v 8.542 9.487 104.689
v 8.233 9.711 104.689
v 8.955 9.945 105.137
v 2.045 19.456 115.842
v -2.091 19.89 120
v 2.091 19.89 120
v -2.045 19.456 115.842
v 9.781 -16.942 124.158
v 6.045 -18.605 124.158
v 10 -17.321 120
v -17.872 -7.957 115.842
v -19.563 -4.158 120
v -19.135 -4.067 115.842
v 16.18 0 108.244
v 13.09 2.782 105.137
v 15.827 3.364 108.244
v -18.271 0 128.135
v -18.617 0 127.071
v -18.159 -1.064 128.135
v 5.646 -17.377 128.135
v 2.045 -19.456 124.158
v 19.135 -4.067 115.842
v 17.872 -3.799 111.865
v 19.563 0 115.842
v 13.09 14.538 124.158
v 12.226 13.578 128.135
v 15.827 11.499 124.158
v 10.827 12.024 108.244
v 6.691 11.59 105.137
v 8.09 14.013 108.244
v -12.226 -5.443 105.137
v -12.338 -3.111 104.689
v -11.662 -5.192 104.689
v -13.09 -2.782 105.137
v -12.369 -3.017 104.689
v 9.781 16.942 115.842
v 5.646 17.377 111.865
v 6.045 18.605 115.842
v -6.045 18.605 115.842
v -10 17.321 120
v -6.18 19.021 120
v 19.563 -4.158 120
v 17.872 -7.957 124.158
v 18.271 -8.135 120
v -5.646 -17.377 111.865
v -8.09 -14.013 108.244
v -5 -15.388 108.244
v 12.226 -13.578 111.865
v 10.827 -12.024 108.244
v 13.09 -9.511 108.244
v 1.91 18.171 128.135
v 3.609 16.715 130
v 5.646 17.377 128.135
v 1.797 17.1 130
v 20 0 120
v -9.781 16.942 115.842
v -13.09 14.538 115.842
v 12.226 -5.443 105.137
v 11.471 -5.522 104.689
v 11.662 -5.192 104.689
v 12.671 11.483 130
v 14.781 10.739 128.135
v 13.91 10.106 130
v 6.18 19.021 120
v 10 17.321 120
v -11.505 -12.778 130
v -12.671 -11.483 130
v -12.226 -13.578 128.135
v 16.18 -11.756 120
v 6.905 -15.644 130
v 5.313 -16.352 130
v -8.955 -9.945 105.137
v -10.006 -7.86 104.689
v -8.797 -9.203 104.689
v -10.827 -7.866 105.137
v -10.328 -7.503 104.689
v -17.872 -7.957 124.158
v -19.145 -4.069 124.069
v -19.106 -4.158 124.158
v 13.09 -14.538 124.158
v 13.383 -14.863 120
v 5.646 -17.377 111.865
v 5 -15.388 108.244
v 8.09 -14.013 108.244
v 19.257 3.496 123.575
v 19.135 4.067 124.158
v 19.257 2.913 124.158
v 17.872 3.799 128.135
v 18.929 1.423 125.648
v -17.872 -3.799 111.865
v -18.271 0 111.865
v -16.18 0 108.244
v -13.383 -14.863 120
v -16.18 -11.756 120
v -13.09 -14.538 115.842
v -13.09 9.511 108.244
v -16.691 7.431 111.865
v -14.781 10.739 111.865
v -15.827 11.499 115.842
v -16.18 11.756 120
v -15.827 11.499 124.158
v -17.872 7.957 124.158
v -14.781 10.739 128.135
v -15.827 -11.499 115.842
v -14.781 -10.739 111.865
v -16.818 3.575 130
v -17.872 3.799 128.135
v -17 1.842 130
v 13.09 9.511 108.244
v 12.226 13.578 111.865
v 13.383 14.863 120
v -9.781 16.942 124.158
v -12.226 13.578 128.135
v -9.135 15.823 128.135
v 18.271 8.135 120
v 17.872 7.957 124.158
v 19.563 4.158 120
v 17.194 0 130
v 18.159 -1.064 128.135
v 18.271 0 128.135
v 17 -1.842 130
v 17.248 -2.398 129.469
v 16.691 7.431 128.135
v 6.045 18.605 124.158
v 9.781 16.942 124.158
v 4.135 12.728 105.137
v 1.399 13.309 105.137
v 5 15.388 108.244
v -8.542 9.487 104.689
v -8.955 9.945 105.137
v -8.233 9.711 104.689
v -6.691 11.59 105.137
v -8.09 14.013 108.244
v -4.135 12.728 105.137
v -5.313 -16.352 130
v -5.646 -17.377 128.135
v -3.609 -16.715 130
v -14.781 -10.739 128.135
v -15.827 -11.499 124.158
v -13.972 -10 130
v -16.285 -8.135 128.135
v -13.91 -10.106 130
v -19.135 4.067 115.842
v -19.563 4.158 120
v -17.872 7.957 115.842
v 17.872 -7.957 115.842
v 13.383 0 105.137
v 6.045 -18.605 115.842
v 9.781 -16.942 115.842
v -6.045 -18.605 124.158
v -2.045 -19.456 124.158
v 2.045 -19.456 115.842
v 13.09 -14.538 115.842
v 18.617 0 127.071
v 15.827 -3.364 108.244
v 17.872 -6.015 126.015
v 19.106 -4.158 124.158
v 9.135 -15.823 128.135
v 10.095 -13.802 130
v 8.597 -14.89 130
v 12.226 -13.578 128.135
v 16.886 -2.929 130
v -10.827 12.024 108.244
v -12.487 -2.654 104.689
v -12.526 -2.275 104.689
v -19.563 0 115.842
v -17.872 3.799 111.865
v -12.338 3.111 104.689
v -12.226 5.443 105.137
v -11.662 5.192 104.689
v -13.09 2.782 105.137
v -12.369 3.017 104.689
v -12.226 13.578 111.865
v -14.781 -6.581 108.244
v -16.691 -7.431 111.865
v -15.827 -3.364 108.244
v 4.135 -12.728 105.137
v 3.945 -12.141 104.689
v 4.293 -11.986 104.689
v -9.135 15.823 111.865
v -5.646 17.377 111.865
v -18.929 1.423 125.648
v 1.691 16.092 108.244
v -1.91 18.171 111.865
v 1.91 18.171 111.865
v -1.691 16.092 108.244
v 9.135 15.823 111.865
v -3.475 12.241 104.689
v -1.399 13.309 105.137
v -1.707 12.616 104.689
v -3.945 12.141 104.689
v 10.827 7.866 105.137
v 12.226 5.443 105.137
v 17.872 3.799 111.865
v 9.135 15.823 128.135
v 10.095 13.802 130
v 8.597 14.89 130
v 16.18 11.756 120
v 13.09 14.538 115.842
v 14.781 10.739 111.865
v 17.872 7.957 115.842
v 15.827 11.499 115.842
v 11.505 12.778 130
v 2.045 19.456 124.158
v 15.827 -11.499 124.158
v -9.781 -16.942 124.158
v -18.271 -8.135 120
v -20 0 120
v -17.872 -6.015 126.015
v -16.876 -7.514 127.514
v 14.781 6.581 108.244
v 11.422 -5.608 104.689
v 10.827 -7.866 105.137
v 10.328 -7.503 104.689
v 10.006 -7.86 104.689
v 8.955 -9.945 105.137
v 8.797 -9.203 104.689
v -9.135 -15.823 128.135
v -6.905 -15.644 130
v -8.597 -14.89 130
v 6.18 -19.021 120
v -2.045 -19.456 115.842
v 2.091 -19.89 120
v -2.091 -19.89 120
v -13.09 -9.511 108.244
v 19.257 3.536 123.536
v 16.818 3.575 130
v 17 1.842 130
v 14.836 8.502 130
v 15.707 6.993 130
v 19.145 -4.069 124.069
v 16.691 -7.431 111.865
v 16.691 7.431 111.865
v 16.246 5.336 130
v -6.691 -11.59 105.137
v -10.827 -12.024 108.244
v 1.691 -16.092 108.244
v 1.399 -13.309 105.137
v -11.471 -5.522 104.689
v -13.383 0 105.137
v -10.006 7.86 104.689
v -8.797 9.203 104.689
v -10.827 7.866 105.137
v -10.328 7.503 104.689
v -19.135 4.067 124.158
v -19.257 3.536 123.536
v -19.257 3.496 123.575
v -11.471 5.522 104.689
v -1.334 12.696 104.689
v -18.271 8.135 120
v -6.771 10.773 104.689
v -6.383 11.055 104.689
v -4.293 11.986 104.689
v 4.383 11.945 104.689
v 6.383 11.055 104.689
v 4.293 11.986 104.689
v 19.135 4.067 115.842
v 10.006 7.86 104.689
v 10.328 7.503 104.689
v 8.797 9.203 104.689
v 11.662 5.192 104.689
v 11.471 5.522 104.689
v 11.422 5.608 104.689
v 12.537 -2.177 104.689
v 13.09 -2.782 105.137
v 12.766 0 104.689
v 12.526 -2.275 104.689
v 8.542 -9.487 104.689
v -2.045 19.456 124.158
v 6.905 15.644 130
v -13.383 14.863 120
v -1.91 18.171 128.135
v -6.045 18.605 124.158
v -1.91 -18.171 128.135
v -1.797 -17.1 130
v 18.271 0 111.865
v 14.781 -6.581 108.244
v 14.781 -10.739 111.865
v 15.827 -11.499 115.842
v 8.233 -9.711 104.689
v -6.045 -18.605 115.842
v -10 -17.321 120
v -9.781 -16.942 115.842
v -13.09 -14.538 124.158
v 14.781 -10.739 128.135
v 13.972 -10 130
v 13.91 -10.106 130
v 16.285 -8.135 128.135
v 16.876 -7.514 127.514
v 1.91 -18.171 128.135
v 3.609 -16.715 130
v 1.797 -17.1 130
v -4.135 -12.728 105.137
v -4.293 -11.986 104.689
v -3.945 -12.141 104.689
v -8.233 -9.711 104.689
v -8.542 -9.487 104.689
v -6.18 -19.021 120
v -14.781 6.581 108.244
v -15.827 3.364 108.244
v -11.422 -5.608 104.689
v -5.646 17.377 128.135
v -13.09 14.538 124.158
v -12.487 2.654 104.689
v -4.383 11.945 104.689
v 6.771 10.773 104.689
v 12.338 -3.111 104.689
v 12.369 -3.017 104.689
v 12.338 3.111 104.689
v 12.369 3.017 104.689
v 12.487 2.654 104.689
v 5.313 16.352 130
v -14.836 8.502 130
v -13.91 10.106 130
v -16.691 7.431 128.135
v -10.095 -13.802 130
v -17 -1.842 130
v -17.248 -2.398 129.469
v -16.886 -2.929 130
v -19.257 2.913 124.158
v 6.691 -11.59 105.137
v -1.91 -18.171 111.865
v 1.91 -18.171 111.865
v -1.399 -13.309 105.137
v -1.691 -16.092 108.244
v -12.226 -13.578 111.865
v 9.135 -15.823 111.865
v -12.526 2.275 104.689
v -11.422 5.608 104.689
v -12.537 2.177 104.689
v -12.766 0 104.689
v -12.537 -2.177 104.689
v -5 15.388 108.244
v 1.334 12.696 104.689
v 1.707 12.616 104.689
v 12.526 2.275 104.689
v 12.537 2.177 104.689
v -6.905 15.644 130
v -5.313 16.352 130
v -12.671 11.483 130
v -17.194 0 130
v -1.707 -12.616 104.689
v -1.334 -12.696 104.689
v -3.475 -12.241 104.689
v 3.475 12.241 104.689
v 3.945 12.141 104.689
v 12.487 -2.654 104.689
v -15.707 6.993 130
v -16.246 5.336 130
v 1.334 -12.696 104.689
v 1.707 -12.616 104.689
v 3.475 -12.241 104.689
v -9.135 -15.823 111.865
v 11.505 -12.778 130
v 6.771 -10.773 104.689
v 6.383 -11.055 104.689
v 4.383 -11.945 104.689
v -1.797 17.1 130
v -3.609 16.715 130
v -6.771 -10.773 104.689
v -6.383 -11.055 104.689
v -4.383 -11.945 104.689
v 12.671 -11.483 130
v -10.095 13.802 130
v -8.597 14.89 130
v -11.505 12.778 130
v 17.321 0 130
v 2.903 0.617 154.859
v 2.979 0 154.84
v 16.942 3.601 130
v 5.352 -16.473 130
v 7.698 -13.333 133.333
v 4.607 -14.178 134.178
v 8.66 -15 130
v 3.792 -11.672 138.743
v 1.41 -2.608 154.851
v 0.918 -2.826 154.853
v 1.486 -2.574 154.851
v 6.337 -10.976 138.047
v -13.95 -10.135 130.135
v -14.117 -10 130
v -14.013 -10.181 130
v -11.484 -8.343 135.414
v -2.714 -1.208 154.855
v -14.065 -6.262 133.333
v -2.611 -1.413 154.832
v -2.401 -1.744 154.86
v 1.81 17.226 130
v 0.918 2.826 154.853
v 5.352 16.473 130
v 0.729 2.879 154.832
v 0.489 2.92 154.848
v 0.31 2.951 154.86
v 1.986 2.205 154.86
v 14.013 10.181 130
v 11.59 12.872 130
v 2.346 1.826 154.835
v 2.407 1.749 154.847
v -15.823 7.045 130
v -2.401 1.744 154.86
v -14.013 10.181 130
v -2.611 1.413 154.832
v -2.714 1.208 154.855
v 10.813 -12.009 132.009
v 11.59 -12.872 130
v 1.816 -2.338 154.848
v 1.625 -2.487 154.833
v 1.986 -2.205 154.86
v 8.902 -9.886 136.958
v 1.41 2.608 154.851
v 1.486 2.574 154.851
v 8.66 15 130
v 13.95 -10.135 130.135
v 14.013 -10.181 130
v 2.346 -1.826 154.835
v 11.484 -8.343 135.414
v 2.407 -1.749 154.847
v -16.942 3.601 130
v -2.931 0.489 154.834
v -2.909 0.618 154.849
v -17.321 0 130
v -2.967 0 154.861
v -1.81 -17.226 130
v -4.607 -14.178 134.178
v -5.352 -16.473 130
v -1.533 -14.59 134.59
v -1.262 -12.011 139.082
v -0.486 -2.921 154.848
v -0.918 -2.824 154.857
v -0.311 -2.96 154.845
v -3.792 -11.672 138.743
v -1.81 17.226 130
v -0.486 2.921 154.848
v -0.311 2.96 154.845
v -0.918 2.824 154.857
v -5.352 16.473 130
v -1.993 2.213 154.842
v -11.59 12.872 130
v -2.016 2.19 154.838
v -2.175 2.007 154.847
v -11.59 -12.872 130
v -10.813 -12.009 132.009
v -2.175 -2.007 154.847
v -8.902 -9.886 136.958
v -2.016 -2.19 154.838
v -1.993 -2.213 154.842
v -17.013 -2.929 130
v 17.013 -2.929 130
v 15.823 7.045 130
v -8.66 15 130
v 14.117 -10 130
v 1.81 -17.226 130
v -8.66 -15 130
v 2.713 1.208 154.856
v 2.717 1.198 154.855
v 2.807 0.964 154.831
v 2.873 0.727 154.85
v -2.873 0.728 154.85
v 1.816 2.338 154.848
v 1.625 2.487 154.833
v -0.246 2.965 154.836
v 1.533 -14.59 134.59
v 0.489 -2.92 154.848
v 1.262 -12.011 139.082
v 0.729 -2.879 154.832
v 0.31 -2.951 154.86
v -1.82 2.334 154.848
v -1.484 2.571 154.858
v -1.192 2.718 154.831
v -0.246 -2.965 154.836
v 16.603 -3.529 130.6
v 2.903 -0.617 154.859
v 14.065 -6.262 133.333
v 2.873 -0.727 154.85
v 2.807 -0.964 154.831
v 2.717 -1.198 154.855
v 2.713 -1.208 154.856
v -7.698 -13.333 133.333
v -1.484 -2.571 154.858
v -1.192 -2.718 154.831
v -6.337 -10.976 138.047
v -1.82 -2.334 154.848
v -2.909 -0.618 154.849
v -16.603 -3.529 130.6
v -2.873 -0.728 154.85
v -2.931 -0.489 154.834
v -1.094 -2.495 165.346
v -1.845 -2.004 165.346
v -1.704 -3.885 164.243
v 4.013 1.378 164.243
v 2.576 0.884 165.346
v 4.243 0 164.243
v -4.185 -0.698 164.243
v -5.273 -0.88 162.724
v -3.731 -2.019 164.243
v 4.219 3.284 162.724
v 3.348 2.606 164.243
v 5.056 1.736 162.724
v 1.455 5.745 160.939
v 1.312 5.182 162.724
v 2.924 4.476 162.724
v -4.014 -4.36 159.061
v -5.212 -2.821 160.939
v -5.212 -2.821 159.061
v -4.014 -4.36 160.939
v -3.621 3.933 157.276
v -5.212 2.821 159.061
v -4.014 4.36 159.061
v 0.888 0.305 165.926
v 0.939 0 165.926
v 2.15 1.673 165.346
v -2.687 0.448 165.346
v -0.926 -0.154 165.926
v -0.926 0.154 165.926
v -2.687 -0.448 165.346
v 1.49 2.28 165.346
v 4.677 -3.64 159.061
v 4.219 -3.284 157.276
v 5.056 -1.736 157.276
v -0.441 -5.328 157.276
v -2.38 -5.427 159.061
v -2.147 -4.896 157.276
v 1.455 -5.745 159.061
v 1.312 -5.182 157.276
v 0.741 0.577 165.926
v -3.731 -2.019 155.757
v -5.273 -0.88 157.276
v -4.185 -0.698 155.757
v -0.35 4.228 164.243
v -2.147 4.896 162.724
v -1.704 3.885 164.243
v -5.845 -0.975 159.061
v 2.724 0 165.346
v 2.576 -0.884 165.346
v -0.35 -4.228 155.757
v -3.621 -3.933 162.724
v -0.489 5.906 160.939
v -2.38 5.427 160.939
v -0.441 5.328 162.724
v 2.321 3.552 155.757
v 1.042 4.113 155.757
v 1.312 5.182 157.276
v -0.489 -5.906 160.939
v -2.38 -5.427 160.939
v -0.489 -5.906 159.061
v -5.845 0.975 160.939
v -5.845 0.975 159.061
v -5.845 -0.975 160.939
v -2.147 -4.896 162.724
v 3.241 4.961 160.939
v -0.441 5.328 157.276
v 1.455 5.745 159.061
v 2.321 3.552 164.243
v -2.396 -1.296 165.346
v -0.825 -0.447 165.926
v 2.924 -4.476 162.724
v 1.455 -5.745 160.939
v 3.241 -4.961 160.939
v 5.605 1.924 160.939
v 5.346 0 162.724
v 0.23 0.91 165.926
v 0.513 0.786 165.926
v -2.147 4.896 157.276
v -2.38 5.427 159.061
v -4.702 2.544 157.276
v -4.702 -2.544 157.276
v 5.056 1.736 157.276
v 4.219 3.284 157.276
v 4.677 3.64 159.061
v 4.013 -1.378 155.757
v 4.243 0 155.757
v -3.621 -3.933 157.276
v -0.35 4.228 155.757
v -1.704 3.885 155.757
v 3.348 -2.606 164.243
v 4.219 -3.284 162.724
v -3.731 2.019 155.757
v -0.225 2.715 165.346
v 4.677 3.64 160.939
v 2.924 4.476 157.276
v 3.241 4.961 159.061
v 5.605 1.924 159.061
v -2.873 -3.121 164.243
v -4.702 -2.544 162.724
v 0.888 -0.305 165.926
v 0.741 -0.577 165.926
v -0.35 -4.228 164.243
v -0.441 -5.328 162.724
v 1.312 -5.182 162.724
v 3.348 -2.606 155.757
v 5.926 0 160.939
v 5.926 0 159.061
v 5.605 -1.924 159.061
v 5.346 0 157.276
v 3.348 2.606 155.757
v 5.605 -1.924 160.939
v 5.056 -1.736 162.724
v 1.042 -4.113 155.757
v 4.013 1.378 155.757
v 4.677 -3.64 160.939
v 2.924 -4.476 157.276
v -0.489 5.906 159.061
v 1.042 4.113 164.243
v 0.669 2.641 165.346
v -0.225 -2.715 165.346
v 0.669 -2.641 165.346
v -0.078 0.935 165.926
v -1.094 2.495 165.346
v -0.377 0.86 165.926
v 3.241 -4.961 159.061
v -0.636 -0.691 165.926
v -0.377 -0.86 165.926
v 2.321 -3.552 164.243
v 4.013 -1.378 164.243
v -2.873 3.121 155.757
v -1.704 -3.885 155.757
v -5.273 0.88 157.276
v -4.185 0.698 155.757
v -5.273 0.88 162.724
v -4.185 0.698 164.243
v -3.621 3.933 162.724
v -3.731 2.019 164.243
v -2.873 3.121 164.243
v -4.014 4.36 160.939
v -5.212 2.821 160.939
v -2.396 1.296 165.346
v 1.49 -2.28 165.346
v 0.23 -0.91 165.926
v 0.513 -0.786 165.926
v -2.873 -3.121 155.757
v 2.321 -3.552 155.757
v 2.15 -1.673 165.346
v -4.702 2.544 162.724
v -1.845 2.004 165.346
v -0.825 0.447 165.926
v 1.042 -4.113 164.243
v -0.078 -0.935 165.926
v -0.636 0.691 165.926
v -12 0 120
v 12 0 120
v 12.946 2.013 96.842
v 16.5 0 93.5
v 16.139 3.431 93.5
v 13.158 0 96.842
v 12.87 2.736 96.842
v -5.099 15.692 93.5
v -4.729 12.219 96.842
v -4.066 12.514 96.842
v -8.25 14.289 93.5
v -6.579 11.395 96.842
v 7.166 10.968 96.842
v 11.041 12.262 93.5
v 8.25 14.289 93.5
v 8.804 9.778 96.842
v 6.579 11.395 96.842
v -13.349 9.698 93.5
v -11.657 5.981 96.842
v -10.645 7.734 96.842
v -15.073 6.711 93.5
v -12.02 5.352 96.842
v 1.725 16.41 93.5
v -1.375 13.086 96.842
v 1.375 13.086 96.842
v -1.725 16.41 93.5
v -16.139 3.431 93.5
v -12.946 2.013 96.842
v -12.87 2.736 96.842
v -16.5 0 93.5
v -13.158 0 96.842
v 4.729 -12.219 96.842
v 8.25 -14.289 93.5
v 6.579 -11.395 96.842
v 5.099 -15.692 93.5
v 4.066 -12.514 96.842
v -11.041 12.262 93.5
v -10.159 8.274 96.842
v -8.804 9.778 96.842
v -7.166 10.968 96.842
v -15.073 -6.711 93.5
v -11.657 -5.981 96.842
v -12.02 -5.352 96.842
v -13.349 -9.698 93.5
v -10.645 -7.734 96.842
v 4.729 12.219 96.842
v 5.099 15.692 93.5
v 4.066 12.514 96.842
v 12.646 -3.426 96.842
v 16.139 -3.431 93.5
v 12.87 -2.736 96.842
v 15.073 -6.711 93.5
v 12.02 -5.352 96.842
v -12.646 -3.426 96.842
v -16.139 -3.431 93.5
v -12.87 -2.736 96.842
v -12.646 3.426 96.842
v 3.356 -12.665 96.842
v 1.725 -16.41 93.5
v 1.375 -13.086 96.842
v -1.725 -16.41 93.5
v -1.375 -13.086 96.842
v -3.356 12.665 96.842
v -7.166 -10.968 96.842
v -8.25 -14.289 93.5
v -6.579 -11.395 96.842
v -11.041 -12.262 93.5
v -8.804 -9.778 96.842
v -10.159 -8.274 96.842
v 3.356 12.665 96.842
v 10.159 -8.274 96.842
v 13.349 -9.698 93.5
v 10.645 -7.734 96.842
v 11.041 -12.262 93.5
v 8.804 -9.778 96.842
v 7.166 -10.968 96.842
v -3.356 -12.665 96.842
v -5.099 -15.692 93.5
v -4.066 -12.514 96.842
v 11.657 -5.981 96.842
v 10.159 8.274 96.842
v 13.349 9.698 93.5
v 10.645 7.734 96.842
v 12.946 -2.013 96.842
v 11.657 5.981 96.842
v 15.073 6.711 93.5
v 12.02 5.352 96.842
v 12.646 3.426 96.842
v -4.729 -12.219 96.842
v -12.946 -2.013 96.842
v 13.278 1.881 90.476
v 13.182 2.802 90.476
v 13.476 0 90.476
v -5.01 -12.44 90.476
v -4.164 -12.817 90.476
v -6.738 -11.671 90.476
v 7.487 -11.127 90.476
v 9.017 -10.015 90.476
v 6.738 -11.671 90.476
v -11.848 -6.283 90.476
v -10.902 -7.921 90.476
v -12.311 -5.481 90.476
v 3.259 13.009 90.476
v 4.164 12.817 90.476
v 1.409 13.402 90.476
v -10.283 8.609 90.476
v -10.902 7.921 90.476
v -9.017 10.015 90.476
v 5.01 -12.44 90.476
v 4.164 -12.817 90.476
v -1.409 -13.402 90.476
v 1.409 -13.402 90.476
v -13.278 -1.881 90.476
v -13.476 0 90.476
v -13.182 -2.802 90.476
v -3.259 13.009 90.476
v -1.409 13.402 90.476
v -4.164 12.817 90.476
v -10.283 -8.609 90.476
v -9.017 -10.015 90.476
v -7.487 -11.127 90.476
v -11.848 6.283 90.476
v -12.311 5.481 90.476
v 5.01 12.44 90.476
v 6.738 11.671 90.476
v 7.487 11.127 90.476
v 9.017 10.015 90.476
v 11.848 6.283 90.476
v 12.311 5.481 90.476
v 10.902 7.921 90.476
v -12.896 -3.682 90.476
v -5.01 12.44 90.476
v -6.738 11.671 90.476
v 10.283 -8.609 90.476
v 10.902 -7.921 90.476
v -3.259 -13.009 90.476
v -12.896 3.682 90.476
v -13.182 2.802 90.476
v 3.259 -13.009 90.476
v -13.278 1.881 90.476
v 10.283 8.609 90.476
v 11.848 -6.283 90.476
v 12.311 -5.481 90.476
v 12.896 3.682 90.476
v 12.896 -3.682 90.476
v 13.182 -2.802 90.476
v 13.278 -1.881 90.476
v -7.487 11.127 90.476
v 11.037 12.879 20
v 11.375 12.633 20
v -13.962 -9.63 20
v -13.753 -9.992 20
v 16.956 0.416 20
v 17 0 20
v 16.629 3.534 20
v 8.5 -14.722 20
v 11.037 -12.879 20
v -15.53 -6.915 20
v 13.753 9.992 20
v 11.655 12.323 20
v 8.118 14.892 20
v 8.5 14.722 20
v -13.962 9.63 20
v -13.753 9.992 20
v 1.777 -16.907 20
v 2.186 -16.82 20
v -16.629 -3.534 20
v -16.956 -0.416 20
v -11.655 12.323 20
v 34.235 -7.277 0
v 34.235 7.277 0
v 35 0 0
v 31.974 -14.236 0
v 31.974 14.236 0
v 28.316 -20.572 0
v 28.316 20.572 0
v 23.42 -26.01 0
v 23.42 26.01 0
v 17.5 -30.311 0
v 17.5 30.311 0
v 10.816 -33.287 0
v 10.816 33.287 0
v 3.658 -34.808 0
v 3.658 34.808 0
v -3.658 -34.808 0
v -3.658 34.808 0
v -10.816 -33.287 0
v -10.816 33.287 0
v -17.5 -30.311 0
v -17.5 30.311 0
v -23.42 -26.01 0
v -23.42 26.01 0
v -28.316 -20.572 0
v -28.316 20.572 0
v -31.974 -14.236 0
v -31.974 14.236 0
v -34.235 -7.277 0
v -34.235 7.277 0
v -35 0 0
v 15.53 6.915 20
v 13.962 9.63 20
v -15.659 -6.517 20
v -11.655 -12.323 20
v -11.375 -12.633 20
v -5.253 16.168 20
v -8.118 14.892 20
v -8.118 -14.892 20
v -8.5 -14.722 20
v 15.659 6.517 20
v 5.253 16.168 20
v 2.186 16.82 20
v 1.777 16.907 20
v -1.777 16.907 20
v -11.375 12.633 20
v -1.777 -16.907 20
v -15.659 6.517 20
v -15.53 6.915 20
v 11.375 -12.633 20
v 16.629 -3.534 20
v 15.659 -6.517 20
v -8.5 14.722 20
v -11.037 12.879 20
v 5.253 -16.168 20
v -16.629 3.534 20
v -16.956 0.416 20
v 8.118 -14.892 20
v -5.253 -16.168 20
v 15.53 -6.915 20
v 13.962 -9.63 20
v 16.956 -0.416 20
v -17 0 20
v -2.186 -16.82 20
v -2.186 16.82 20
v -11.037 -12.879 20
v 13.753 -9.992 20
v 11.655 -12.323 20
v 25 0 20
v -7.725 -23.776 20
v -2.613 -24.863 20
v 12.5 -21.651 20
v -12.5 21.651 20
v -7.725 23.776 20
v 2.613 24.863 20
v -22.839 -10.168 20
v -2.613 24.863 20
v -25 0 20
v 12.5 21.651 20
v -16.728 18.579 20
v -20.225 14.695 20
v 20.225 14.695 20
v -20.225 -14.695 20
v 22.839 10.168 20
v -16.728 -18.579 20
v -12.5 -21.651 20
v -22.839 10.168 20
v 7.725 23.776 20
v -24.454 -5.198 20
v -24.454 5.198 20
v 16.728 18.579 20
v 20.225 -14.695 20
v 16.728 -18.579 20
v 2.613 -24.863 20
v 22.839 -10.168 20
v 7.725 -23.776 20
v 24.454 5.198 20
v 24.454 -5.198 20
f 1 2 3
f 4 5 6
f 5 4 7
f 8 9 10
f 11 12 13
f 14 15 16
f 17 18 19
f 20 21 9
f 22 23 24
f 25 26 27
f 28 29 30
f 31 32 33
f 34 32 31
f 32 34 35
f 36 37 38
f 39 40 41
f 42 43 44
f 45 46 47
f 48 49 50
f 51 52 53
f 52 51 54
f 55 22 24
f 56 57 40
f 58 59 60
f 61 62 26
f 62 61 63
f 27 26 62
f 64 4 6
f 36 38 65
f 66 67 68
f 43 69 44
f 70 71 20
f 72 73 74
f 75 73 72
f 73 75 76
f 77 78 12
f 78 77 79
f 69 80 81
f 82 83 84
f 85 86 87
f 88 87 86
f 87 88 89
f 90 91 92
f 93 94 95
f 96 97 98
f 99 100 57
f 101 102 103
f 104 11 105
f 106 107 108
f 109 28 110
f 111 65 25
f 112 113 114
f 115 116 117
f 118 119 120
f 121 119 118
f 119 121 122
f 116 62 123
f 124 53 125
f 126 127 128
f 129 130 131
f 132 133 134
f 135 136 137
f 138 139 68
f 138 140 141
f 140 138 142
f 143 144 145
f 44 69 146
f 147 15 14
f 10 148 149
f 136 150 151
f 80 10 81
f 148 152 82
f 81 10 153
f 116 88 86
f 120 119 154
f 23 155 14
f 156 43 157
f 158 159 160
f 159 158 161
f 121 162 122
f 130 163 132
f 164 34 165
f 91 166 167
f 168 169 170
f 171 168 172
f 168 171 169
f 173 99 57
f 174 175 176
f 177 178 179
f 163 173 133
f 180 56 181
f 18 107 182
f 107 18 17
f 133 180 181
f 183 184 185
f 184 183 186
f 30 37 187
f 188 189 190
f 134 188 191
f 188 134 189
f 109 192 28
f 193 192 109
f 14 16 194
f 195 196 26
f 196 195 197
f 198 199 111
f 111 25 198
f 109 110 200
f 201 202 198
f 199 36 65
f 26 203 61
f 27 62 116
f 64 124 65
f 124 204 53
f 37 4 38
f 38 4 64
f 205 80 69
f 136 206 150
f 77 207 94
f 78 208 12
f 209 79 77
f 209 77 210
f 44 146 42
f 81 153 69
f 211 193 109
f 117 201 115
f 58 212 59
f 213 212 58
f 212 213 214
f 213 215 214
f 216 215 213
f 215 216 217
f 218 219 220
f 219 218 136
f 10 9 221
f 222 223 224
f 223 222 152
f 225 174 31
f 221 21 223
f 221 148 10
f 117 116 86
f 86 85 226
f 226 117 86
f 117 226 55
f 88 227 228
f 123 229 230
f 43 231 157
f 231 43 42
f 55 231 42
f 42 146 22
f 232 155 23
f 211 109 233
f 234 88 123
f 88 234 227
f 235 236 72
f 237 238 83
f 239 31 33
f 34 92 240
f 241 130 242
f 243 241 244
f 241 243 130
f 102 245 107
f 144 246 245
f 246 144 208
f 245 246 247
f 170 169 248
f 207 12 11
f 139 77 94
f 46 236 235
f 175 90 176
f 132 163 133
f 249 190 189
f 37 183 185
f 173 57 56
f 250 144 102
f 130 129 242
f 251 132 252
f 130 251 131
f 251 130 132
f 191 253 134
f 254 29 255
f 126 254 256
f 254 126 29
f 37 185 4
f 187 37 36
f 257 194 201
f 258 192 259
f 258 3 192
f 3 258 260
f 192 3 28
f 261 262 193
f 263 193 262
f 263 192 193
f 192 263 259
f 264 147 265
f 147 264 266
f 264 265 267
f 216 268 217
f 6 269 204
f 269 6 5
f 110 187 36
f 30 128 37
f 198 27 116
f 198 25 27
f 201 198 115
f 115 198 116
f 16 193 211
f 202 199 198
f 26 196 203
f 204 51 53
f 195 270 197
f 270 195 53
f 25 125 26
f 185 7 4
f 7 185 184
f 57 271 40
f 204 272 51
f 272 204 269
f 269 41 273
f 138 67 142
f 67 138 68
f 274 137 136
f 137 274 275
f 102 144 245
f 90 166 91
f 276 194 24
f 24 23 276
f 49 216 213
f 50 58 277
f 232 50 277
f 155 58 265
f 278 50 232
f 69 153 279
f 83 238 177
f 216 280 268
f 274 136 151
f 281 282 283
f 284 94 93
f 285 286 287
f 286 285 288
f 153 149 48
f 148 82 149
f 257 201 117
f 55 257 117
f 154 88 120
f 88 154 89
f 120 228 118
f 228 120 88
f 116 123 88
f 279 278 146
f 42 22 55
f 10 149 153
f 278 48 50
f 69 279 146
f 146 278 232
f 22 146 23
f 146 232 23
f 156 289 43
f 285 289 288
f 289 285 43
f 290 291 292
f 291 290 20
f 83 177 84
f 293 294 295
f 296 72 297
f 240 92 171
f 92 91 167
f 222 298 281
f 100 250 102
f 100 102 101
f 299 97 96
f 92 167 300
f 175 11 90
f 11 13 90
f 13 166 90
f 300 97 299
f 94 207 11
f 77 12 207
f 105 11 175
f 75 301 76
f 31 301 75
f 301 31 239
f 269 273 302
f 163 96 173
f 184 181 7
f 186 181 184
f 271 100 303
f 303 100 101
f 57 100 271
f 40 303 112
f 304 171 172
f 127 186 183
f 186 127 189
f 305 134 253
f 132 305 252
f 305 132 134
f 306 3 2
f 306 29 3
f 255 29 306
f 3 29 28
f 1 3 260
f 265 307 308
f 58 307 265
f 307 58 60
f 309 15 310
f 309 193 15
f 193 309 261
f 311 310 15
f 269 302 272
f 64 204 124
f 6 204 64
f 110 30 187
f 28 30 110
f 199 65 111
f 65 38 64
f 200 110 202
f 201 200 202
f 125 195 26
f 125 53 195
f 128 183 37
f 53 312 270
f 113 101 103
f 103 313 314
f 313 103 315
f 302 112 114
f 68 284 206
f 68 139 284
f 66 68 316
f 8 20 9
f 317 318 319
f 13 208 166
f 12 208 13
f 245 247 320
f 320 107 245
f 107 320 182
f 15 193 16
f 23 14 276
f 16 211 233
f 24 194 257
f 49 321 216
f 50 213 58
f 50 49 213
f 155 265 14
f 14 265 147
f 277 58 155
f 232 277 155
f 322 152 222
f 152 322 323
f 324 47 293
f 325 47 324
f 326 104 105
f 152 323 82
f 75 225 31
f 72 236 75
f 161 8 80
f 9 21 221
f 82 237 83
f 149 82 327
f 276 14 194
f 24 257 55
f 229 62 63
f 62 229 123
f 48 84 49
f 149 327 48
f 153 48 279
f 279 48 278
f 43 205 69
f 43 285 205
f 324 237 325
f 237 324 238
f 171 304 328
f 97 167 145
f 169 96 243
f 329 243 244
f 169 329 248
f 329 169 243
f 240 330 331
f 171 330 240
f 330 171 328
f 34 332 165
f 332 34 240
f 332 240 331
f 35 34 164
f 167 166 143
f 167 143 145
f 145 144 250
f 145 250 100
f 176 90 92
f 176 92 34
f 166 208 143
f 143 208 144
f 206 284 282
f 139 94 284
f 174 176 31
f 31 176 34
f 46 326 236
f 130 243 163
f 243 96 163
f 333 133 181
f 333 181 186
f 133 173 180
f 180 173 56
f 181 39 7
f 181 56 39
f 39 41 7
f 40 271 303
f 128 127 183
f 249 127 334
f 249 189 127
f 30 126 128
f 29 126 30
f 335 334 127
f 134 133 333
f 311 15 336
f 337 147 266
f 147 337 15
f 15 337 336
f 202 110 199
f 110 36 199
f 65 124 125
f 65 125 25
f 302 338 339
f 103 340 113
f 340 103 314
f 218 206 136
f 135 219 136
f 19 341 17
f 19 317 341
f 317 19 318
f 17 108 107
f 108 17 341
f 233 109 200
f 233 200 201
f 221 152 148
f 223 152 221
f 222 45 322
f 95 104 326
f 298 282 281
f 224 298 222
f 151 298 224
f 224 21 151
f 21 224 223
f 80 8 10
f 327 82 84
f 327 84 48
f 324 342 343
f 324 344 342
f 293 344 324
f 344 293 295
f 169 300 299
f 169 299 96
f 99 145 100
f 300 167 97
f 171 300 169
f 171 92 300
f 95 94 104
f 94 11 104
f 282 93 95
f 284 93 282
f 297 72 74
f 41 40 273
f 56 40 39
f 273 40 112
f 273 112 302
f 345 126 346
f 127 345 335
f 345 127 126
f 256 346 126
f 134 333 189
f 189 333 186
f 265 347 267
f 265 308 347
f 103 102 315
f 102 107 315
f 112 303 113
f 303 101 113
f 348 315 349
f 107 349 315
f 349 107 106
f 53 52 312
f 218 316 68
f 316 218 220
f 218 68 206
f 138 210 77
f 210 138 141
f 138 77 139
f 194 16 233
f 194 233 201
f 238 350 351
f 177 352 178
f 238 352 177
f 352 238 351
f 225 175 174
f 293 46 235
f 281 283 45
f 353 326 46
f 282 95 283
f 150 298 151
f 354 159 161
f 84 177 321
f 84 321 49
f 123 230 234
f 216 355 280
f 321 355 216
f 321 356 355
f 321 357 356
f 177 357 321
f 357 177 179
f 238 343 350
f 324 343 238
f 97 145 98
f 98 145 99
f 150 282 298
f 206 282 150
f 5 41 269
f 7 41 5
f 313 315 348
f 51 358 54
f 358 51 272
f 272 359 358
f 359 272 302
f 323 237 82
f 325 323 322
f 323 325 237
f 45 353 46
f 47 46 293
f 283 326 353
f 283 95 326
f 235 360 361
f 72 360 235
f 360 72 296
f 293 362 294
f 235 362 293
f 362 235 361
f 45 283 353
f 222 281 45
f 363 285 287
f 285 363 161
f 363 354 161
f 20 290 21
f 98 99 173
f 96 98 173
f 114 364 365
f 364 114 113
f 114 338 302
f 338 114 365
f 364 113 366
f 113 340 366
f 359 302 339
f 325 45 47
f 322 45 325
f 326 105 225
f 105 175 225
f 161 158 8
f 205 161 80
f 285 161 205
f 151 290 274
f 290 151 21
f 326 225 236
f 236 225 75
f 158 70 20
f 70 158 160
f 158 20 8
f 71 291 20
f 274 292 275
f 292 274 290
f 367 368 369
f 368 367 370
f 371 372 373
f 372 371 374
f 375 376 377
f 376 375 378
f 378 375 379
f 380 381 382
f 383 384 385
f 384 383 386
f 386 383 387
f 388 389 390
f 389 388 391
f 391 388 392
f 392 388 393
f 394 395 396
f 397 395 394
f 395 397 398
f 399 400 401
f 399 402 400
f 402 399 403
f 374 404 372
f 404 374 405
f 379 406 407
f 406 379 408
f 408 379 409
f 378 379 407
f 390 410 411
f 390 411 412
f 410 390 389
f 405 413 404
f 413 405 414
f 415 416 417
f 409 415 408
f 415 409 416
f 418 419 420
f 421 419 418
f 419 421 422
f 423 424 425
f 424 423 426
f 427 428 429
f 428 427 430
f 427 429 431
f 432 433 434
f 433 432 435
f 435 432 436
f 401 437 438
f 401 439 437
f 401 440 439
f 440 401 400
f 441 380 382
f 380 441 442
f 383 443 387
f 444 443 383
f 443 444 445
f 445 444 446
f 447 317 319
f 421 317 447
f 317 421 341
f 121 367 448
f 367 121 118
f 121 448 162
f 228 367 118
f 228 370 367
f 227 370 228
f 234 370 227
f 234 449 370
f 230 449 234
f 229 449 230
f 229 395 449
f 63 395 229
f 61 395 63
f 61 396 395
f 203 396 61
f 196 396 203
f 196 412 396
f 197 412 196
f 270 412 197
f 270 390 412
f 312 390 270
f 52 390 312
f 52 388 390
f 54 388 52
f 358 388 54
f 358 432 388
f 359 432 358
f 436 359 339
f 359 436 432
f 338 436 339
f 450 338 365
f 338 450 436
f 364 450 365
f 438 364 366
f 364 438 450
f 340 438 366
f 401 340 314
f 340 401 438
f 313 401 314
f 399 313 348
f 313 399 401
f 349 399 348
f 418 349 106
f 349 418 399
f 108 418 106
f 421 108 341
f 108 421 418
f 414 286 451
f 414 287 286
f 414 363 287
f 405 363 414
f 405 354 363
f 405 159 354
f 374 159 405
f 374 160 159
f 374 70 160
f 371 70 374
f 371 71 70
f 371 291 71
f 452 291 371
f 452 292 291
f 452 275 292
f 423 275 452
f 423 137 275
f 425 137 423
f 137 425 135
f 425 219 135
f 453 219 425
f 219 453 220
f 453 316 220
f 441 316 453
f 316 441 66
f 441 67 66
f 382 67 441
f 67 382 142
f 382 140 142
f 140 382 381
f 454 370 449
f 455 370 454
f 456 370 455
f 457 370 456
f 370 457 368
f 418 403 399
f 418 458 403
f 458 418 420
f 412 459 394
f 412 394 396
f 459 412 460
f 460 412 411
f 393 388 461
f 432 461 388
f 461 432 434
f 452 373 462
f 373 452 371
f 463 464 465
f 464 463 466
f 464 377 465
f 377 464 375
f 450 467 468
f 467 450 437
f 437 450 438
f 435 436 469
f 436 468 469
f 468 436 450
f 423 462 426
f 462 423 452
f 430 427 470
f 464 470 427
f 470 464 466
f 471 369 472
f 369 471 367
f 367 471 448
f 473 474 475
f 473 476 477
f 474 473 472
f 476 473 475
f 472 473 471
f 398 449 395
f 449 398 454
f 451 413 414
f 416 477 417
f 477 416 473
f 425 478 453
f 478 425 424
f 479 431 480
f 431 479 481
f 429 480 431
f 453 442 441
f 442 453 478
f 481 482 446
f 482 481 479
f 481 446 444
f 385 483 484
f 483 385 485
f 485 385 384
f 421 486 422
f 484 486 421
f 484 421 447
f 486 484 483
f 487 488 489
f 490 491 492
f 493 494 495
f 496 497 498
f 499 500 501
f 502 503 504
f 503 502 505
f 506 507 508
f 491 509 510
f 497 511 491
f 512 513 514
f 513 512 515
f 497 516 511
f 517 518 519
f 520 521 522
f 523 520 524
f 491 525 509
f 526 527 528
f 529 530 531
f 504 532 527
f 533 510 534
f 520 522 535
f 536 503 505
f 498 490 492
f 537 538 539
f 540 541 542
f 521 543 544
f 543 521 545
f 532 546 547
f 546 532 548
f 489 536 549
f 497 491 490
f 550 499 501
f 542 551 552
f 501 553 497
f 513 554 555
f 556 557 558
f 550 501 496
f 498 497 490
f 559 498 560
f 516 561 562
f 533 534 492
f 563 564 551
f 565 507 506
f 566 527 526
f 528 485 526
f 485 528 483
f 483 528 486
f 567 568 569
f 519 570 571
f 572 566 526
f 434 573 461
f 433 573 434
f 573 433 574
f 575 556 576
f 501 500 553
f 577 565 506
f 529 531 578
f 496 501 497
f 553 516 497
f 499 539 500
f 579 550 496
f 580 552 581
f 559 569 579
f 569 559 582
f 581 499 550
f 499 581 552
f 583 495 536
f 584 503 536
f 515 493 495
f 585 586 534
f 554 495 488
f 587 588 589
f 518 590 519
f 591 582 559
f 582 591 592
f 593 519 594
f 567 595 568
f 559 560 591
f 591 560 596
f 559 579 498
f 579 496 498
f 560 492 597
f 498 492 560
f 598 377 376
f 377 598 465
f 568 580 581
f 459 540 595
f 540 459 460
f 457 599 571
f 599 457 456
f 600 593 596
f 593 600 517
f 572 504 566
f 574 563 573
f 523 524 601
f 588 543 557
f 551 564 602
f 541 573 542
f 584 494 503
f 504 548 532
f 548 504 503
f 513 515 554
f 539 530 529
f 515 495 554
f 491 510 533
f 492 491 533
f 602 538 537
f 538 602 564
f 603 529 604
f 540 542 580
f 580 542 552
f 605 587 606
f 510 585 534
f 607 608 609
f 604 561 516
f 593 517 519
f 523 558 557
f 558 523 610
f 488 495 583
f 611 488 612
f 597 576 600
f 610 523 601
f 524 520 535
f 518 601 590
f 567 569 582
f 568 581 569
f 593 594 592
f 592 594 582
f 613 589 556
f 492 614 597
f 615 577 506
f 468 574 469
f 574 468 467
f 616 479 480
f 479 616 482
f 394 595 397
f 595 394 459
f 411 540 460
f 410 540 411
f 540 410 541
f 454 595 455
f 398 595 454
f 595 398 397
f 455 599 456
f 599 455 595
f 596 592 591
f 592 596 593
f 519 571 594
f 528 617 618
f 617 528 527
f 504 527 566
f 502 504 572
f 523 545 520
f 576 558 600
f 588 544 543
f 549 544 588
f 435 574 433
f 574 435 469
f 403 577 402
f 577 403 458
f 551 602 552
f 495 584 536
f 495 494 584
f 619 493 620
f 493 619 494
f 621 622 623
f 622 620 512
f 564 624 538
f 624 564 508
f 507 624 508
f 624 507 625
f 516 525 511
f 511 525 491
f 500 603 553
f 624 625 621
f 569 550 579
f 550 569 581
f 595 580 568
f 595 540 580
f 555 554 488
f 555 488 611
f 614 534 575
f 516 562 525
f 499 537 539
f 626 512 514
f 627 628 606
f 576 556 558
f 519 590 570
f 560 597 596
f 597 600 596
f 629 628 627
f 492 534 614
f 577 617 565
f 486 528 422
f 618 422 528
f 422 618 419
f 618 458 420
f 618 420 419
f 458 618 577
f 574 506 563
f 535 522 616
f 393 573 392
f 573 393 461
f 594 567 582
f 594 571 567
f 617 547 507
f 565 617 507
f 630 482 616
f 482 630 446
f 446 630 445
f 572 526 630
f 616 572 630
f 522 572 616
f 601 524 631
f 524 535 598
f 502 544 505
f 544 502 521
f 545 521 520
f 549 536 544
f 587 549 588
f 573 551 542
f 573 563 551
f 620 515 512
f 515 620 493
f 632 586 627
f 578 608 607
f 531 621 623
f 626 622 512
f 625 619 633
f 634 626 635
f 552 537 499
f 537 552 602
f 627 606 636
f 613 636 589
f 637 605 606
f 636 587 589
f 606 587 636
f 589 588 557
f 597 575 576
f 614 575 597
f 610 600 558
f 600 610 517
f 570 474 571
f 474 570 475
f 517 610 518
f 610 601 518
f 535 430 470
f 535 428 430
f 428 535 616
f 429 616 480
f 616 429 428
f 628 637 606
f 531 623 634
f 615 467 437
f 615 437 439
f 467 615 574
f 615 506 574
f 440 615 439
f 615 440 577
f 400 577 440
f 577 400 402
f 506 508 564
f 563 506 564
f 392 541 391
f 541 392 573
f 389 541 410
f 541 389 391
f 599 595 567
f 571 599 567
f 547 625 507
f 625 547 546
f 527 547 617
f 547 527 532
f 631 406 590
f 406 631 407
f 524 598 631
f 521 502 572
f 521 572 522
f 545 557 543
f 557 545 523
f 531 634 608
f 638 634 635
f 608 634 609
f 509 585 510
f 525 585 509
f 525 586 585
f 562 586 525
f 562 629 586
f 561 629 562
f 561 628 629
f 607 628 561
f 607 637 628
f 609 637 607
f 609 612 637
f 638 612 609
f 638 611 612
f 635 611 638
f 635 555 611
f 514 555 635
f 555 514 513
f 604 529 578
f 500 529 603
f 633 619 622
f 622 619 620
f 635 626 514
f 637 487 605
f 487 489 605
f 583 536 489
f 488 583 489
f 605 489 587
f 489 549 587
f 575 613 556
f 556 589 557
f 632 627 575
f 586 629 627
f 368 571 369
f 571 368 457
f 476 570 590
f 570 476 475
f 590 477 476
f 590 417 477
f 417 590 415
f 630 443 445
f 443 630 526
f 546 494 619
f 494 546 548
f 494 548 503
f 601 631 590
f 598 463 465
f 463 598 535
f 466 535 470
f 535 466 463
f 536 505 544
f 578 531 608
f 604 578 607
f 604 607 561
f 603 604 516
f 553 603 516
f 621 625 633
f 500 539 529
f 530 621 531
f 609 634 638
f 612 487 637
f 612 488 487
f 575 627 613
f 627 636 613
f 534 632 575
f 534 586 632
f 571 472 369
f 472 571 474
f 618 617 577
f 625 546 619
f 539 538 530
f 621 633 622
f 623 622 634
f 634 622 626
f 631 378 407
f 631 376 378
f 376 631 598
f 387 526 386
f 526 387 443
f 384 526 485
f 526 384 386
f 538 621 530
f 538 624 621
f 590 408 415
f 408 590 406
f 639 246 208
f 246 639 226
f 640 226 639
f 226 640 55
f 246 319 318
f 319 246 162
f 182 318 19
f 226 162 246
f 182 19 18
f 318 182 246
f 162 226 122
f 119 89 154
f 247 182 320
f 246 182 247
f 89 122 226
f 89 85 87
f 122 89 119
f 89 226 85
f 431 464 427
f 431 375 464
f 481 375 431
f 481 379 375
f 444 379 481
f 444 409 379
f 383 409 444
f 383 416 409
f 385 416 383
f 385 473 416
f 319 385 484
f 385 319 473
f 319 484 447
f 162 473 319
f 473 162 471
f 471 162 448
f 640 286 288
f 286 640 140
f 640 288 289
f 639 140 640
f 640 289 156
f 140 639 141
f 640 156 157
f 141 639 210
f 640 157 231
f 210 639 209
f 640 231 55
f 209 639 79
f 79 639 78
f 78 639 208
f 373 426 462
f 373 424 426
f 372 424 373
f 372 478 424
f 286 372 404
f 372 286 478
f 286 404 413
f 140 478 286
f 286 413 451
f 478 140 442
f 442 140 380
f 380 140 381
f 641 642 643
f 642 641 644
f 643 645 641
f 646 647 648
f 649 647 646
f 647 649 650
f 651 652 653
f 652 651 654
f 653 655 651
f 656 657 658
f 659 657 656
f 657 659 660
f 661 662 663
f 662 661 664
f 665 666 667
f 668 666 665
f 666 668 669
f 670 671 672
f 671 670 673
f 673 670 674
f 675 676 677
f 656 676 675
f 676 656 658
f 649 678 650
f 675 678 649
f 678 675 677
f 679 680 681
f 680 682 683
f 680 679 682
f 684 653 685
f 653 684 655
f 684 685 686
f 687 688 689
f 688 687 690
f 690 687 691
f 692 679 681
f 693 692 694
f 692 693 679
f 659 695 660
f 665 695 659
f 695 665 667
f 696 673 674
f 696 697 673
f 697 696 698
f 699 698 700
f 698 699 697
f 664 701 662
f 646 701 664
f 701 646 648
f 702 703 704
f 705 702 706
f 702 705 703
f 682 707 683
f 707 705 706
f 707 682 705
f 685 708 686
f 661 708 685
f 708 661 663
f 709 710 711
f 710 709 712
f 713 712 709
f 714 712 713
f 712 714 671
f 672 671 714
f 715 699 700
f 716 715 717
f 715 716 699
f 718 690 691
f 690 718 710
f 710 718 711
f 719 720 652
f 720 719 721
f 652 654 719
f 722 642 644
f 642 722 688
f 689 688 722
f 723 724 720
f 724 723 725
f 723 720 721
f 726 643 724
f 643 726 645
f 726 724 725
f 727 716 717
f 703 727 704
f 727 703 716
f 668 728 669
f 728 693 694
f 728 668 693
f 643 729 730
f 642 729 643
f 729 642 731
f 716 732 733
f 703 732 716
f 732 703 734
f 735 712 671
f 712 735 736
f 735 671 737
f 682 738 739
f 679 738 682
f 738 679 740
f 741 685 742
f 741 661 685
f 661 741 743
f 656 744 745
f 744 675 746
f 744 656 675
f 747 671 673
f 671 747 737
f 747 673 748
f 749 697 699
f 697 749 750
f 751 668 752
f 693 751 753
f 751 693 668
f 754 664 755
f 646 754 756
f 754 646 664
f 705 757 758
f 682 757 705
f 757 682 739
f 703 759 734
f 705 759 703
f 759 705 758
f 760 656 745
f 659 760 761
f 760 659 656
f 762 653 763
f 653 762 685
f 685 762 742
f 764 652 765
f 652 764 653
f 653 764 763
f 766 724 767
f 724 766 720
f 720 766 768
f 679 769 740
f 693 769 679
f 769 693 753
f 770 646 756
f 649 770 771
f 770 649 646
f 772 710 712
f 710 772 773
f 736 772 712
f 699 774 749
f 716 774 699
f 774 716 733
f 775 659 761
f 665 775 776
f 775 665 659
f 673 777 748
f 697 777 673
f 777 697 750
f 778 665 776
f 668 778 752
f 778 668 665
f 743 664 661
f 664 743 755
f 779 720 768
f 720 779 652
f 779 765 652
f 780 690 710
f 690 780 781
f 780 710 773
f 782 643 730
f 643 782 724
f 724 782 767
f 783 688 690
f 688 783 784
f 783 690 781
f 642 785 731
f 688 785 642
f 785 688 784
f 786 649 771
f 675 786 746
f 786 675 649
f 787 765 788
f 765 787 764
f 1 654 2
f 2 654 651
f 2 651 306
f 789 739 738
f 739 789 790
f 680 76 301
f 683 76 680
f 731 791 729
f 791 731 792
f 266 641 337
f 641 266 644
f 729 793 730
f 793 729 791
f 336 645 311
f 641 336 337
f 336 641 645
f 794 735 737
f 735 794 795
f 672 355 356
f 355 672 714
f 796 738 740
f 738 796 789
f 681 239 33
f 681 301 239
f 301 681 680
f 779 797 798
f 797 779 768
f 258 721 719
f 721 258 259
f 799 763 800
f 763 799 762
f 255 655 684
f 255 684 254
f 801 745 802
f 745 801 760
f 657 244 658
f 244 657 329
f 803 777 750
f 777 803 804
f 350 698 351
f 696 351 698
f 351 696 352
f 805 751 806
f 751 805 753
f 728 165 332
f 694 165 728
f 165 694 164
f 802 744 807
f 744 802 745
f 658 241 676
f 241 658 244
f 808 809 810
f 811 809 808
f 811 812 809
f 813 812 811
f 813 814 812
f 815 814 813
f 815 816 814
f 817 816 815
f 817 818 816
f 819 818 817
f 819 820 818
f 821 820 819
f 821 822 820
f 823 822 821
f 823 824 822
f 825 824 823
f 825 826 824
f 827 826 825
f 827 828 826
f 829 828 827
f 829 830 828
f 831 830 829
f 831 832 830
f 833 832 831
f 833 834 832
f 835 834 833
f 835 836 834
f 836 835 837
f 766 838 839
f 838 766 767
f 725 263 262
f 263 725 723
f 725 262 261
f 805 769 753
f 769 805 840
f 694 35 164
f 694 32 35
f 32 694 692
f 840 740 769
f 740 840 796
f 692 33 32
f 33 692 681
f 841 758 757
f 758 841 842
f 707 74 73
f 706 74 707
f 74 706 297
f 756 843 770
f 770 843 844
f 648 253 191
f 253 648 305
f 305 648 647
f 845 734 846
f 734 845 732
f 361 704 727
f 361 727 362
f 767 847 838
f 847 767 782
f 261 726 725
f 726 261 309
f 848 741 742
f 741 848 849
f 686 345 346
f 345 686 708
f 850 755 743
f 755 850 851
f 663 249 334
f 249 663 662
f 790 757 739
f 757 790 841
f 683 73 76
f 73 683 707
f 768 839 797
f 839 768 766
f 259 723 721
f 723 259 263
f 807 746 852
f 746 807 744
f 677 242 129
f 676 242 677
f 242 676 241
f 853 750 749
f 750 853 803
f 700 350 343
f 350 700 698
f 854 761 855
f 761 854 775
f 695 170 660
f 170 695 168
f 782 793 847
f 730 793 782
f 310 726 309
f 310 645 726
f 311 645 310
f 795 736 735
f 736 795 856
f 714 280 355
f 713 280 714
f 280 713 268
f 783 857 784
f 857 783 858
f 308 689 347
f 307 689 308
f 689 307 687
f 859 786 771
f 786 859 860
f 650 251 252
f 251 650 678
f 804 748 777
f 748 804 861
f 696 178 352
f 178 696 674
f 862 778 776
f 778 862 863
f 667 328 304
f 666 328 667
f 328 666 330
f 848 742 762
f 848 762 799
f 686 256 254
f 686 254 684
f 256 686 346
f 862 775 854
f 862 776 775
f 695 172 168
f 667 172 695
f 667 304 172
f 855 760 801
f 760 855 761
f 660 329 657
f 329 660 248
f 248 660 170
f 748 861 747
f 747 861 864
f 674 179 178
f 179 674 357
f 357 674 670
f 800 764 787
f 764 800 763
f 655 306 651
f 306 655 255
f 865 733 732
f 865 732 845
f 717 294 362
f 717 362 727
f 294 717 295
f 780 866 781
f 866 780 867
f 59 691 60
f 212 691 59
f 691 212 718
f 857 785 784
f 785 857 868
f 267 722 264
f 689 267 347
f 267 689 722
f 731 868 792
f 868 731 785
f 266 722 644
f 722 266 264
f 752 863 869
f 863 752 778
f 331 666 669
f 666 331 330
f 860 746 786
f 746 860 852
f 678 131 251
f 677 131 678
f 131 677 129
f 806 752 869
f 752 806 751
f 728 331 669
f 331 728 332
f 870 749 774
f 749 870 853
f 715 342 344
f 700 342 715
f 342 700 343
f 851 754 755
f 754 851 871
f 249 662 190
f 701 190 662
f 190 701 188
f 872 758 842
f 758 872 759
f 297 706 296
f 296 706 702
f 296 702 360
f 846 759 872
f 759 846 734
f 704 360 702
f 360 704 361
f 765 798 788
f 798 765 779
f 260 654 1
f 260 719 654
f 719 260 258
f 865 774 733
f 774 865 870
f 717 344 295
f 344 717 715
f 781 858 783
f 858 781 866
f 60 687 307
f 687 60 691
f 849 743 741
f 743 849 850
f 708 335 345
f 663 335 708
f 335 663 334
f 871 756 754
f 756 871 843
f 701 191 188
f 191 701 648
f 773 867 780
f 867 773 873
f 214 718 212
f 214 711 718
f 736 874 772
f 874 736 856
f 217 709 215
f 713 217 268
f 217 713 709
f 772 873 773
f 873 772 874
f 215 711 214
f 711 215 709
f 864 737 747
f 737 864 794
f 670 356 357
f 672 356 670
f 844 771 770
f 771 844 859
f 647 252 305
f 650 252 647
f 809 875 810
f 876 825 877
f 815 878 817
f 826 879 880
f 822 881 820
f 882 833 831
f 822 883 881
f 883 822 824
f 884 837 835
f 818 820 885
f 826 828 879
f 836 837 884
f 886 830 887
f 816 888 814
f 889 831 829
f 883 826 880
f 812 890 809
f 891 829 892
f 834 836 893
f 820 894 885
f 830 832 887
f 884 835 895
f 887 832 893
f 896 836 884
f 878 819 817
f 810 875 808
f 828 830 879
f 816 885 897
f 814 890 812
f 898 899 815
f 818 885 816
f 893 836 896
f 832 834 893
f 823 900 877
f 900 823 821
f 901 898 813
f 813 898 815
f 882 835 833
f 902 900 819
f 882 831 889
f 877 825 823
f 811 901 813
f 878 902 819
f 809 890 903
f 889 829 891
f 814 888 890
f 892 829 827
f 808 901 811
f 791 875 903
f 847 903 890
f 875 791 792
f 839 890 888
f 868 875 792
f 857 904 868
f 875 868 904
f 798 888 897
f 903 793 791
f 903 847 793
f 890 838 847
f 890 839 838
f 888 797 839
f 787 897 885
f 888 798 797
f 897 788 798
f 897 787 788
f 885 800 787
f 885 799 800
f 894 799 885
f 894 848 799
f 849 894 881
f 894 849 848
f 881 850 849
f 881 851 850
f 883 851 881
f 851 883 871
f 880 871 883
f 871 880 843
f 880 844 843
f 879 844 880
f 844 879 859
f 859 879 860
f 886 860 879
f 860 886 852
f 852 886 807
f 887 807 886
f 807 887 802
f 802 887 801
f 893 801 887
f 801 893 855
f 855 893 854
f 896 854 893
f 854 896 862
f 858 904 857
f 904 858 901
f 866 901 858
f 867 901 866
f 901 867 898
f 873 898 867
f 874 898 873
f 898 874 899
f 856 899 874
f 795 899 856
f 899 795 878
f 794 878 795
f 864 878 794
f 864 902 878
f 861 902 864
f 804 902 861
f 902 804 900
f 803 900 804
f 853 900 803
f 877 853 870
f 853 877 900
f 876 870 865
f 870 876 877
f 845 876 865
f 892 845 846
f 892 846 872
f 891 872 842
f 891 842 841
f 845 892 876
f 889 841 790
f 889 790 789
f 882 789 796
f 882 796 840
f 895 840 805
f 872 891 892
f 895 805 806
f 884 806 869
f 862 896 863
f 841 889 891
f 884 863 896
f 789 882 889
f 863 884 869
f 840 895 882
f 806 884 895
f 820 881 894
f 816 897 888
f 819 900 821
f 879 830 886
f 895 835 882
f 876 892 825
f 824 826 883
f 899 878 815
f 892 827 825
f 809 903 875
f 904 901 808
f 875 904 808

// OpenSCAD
union() {
  // head
  translate([0, 0, 120])
    difference() {
      union() {
        // teardrop shape
        sphere(r = 20);
        translate([0, 0, 20 * sin(30)])
          cylinder(h = 30, r1 = 20 * cos(30), r2 = 0);

        // dollop
        translate([0, 0, 30 + 20 * sin(30)])
          sphere(r = 6);
      }
      //cut out slot
      rotate([45, 0, 0])
        translate([-20, 0, 0])
          cube([40, 5, 40]);
    }
  // neck
  cylinder(h = 120, r1 = 18, r2 = 12);

  // base
  cylinder(h = 20, r1 = 35, r2 = 25);

  // collar
  translate([0, 0, 90])
    intersection() {
      cylinder(h = 20, r1 = 20, r2 = 0);
      translate([0, 0, 7])
        mirror([0, 0, 1])
          cylinder(h = 20, r1 = 20, r2 = 0);
    }
}
